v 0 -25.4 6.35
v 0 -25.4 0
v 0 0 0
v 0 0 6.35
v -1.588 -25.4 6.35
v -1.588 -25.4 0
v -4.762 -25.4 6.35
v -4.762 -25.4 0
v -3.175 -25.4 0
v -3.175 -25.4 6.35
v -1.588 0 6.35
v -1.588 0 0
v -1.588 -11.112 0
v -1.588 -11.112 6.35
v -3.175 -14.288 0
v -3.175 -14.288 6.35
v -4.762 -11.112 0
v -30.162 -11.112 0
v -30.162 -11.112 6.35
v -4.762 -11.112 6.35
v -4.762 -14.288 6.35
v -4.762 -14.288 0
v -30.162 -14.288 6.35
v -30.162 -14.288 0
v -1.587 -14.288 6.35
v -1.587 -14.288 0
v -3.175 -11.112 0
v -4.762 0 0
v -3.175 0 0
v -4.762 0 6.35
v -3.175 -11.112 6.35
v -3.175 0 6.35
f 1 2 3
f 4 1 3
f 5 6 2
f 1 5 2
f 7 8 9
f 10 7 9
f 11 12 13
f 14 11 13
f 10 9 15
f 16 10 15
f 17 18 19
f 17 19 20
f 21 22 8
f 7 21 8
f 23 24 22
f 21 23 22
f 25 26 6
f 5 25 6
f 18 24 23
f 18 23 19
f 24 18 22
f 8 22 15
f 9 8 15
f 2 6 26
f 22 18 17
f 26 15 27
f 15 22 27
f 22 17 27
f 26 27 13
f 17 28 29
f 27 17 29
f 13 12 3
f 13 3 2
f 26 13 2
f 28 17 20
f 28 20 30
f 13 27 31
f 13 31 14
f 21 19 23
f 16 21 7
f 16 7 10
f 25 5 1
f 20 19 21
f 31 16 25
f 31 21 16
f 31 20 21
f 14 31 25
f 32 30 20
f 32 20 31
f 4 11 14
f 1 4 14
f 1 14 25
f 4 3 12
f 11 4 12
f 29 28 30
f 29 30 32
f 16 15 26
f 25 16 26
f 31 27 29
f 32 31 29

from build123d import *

# Parameters (mm, degrees)
F0_W     = 25.4
F0_H     = 3.175
F0_W_2   = 1.5875
F0_H_2   = 11.1125
F1_DEPTH = 6.35


with BuildPart() as f1:
    # F0 (on Top) → F1 (new body)
    with BuildSketch(Plane.XY):
        with Locations((-17.4625, -12.7)):
            Rectangle(F0_W, F0_H)
        with Locations((-3.96875, -5.55625)):
            Rectangle(F0_W_2, F0_H_2)
        Polygon((-3.175, -14.2875), (-3.175, -11.1125), (-4.7625, -11.1125), (-4.7625, -14.2875), (-4.7625, -25.4), (-3.175, -25.4), align=None)
        with Locations((-2.38125, -12.7)):
            Rectangle(F0_W_2, F0_H)
        Polygon((0, -25.4), (0, 0), (-1.5875, 0), (-1.5875, -11.1125), (-1.5875, -14.2875), (-1.5875, -25.4), align=None)
    extrude(amount=F1_DEPTH)


solid = f1.part
